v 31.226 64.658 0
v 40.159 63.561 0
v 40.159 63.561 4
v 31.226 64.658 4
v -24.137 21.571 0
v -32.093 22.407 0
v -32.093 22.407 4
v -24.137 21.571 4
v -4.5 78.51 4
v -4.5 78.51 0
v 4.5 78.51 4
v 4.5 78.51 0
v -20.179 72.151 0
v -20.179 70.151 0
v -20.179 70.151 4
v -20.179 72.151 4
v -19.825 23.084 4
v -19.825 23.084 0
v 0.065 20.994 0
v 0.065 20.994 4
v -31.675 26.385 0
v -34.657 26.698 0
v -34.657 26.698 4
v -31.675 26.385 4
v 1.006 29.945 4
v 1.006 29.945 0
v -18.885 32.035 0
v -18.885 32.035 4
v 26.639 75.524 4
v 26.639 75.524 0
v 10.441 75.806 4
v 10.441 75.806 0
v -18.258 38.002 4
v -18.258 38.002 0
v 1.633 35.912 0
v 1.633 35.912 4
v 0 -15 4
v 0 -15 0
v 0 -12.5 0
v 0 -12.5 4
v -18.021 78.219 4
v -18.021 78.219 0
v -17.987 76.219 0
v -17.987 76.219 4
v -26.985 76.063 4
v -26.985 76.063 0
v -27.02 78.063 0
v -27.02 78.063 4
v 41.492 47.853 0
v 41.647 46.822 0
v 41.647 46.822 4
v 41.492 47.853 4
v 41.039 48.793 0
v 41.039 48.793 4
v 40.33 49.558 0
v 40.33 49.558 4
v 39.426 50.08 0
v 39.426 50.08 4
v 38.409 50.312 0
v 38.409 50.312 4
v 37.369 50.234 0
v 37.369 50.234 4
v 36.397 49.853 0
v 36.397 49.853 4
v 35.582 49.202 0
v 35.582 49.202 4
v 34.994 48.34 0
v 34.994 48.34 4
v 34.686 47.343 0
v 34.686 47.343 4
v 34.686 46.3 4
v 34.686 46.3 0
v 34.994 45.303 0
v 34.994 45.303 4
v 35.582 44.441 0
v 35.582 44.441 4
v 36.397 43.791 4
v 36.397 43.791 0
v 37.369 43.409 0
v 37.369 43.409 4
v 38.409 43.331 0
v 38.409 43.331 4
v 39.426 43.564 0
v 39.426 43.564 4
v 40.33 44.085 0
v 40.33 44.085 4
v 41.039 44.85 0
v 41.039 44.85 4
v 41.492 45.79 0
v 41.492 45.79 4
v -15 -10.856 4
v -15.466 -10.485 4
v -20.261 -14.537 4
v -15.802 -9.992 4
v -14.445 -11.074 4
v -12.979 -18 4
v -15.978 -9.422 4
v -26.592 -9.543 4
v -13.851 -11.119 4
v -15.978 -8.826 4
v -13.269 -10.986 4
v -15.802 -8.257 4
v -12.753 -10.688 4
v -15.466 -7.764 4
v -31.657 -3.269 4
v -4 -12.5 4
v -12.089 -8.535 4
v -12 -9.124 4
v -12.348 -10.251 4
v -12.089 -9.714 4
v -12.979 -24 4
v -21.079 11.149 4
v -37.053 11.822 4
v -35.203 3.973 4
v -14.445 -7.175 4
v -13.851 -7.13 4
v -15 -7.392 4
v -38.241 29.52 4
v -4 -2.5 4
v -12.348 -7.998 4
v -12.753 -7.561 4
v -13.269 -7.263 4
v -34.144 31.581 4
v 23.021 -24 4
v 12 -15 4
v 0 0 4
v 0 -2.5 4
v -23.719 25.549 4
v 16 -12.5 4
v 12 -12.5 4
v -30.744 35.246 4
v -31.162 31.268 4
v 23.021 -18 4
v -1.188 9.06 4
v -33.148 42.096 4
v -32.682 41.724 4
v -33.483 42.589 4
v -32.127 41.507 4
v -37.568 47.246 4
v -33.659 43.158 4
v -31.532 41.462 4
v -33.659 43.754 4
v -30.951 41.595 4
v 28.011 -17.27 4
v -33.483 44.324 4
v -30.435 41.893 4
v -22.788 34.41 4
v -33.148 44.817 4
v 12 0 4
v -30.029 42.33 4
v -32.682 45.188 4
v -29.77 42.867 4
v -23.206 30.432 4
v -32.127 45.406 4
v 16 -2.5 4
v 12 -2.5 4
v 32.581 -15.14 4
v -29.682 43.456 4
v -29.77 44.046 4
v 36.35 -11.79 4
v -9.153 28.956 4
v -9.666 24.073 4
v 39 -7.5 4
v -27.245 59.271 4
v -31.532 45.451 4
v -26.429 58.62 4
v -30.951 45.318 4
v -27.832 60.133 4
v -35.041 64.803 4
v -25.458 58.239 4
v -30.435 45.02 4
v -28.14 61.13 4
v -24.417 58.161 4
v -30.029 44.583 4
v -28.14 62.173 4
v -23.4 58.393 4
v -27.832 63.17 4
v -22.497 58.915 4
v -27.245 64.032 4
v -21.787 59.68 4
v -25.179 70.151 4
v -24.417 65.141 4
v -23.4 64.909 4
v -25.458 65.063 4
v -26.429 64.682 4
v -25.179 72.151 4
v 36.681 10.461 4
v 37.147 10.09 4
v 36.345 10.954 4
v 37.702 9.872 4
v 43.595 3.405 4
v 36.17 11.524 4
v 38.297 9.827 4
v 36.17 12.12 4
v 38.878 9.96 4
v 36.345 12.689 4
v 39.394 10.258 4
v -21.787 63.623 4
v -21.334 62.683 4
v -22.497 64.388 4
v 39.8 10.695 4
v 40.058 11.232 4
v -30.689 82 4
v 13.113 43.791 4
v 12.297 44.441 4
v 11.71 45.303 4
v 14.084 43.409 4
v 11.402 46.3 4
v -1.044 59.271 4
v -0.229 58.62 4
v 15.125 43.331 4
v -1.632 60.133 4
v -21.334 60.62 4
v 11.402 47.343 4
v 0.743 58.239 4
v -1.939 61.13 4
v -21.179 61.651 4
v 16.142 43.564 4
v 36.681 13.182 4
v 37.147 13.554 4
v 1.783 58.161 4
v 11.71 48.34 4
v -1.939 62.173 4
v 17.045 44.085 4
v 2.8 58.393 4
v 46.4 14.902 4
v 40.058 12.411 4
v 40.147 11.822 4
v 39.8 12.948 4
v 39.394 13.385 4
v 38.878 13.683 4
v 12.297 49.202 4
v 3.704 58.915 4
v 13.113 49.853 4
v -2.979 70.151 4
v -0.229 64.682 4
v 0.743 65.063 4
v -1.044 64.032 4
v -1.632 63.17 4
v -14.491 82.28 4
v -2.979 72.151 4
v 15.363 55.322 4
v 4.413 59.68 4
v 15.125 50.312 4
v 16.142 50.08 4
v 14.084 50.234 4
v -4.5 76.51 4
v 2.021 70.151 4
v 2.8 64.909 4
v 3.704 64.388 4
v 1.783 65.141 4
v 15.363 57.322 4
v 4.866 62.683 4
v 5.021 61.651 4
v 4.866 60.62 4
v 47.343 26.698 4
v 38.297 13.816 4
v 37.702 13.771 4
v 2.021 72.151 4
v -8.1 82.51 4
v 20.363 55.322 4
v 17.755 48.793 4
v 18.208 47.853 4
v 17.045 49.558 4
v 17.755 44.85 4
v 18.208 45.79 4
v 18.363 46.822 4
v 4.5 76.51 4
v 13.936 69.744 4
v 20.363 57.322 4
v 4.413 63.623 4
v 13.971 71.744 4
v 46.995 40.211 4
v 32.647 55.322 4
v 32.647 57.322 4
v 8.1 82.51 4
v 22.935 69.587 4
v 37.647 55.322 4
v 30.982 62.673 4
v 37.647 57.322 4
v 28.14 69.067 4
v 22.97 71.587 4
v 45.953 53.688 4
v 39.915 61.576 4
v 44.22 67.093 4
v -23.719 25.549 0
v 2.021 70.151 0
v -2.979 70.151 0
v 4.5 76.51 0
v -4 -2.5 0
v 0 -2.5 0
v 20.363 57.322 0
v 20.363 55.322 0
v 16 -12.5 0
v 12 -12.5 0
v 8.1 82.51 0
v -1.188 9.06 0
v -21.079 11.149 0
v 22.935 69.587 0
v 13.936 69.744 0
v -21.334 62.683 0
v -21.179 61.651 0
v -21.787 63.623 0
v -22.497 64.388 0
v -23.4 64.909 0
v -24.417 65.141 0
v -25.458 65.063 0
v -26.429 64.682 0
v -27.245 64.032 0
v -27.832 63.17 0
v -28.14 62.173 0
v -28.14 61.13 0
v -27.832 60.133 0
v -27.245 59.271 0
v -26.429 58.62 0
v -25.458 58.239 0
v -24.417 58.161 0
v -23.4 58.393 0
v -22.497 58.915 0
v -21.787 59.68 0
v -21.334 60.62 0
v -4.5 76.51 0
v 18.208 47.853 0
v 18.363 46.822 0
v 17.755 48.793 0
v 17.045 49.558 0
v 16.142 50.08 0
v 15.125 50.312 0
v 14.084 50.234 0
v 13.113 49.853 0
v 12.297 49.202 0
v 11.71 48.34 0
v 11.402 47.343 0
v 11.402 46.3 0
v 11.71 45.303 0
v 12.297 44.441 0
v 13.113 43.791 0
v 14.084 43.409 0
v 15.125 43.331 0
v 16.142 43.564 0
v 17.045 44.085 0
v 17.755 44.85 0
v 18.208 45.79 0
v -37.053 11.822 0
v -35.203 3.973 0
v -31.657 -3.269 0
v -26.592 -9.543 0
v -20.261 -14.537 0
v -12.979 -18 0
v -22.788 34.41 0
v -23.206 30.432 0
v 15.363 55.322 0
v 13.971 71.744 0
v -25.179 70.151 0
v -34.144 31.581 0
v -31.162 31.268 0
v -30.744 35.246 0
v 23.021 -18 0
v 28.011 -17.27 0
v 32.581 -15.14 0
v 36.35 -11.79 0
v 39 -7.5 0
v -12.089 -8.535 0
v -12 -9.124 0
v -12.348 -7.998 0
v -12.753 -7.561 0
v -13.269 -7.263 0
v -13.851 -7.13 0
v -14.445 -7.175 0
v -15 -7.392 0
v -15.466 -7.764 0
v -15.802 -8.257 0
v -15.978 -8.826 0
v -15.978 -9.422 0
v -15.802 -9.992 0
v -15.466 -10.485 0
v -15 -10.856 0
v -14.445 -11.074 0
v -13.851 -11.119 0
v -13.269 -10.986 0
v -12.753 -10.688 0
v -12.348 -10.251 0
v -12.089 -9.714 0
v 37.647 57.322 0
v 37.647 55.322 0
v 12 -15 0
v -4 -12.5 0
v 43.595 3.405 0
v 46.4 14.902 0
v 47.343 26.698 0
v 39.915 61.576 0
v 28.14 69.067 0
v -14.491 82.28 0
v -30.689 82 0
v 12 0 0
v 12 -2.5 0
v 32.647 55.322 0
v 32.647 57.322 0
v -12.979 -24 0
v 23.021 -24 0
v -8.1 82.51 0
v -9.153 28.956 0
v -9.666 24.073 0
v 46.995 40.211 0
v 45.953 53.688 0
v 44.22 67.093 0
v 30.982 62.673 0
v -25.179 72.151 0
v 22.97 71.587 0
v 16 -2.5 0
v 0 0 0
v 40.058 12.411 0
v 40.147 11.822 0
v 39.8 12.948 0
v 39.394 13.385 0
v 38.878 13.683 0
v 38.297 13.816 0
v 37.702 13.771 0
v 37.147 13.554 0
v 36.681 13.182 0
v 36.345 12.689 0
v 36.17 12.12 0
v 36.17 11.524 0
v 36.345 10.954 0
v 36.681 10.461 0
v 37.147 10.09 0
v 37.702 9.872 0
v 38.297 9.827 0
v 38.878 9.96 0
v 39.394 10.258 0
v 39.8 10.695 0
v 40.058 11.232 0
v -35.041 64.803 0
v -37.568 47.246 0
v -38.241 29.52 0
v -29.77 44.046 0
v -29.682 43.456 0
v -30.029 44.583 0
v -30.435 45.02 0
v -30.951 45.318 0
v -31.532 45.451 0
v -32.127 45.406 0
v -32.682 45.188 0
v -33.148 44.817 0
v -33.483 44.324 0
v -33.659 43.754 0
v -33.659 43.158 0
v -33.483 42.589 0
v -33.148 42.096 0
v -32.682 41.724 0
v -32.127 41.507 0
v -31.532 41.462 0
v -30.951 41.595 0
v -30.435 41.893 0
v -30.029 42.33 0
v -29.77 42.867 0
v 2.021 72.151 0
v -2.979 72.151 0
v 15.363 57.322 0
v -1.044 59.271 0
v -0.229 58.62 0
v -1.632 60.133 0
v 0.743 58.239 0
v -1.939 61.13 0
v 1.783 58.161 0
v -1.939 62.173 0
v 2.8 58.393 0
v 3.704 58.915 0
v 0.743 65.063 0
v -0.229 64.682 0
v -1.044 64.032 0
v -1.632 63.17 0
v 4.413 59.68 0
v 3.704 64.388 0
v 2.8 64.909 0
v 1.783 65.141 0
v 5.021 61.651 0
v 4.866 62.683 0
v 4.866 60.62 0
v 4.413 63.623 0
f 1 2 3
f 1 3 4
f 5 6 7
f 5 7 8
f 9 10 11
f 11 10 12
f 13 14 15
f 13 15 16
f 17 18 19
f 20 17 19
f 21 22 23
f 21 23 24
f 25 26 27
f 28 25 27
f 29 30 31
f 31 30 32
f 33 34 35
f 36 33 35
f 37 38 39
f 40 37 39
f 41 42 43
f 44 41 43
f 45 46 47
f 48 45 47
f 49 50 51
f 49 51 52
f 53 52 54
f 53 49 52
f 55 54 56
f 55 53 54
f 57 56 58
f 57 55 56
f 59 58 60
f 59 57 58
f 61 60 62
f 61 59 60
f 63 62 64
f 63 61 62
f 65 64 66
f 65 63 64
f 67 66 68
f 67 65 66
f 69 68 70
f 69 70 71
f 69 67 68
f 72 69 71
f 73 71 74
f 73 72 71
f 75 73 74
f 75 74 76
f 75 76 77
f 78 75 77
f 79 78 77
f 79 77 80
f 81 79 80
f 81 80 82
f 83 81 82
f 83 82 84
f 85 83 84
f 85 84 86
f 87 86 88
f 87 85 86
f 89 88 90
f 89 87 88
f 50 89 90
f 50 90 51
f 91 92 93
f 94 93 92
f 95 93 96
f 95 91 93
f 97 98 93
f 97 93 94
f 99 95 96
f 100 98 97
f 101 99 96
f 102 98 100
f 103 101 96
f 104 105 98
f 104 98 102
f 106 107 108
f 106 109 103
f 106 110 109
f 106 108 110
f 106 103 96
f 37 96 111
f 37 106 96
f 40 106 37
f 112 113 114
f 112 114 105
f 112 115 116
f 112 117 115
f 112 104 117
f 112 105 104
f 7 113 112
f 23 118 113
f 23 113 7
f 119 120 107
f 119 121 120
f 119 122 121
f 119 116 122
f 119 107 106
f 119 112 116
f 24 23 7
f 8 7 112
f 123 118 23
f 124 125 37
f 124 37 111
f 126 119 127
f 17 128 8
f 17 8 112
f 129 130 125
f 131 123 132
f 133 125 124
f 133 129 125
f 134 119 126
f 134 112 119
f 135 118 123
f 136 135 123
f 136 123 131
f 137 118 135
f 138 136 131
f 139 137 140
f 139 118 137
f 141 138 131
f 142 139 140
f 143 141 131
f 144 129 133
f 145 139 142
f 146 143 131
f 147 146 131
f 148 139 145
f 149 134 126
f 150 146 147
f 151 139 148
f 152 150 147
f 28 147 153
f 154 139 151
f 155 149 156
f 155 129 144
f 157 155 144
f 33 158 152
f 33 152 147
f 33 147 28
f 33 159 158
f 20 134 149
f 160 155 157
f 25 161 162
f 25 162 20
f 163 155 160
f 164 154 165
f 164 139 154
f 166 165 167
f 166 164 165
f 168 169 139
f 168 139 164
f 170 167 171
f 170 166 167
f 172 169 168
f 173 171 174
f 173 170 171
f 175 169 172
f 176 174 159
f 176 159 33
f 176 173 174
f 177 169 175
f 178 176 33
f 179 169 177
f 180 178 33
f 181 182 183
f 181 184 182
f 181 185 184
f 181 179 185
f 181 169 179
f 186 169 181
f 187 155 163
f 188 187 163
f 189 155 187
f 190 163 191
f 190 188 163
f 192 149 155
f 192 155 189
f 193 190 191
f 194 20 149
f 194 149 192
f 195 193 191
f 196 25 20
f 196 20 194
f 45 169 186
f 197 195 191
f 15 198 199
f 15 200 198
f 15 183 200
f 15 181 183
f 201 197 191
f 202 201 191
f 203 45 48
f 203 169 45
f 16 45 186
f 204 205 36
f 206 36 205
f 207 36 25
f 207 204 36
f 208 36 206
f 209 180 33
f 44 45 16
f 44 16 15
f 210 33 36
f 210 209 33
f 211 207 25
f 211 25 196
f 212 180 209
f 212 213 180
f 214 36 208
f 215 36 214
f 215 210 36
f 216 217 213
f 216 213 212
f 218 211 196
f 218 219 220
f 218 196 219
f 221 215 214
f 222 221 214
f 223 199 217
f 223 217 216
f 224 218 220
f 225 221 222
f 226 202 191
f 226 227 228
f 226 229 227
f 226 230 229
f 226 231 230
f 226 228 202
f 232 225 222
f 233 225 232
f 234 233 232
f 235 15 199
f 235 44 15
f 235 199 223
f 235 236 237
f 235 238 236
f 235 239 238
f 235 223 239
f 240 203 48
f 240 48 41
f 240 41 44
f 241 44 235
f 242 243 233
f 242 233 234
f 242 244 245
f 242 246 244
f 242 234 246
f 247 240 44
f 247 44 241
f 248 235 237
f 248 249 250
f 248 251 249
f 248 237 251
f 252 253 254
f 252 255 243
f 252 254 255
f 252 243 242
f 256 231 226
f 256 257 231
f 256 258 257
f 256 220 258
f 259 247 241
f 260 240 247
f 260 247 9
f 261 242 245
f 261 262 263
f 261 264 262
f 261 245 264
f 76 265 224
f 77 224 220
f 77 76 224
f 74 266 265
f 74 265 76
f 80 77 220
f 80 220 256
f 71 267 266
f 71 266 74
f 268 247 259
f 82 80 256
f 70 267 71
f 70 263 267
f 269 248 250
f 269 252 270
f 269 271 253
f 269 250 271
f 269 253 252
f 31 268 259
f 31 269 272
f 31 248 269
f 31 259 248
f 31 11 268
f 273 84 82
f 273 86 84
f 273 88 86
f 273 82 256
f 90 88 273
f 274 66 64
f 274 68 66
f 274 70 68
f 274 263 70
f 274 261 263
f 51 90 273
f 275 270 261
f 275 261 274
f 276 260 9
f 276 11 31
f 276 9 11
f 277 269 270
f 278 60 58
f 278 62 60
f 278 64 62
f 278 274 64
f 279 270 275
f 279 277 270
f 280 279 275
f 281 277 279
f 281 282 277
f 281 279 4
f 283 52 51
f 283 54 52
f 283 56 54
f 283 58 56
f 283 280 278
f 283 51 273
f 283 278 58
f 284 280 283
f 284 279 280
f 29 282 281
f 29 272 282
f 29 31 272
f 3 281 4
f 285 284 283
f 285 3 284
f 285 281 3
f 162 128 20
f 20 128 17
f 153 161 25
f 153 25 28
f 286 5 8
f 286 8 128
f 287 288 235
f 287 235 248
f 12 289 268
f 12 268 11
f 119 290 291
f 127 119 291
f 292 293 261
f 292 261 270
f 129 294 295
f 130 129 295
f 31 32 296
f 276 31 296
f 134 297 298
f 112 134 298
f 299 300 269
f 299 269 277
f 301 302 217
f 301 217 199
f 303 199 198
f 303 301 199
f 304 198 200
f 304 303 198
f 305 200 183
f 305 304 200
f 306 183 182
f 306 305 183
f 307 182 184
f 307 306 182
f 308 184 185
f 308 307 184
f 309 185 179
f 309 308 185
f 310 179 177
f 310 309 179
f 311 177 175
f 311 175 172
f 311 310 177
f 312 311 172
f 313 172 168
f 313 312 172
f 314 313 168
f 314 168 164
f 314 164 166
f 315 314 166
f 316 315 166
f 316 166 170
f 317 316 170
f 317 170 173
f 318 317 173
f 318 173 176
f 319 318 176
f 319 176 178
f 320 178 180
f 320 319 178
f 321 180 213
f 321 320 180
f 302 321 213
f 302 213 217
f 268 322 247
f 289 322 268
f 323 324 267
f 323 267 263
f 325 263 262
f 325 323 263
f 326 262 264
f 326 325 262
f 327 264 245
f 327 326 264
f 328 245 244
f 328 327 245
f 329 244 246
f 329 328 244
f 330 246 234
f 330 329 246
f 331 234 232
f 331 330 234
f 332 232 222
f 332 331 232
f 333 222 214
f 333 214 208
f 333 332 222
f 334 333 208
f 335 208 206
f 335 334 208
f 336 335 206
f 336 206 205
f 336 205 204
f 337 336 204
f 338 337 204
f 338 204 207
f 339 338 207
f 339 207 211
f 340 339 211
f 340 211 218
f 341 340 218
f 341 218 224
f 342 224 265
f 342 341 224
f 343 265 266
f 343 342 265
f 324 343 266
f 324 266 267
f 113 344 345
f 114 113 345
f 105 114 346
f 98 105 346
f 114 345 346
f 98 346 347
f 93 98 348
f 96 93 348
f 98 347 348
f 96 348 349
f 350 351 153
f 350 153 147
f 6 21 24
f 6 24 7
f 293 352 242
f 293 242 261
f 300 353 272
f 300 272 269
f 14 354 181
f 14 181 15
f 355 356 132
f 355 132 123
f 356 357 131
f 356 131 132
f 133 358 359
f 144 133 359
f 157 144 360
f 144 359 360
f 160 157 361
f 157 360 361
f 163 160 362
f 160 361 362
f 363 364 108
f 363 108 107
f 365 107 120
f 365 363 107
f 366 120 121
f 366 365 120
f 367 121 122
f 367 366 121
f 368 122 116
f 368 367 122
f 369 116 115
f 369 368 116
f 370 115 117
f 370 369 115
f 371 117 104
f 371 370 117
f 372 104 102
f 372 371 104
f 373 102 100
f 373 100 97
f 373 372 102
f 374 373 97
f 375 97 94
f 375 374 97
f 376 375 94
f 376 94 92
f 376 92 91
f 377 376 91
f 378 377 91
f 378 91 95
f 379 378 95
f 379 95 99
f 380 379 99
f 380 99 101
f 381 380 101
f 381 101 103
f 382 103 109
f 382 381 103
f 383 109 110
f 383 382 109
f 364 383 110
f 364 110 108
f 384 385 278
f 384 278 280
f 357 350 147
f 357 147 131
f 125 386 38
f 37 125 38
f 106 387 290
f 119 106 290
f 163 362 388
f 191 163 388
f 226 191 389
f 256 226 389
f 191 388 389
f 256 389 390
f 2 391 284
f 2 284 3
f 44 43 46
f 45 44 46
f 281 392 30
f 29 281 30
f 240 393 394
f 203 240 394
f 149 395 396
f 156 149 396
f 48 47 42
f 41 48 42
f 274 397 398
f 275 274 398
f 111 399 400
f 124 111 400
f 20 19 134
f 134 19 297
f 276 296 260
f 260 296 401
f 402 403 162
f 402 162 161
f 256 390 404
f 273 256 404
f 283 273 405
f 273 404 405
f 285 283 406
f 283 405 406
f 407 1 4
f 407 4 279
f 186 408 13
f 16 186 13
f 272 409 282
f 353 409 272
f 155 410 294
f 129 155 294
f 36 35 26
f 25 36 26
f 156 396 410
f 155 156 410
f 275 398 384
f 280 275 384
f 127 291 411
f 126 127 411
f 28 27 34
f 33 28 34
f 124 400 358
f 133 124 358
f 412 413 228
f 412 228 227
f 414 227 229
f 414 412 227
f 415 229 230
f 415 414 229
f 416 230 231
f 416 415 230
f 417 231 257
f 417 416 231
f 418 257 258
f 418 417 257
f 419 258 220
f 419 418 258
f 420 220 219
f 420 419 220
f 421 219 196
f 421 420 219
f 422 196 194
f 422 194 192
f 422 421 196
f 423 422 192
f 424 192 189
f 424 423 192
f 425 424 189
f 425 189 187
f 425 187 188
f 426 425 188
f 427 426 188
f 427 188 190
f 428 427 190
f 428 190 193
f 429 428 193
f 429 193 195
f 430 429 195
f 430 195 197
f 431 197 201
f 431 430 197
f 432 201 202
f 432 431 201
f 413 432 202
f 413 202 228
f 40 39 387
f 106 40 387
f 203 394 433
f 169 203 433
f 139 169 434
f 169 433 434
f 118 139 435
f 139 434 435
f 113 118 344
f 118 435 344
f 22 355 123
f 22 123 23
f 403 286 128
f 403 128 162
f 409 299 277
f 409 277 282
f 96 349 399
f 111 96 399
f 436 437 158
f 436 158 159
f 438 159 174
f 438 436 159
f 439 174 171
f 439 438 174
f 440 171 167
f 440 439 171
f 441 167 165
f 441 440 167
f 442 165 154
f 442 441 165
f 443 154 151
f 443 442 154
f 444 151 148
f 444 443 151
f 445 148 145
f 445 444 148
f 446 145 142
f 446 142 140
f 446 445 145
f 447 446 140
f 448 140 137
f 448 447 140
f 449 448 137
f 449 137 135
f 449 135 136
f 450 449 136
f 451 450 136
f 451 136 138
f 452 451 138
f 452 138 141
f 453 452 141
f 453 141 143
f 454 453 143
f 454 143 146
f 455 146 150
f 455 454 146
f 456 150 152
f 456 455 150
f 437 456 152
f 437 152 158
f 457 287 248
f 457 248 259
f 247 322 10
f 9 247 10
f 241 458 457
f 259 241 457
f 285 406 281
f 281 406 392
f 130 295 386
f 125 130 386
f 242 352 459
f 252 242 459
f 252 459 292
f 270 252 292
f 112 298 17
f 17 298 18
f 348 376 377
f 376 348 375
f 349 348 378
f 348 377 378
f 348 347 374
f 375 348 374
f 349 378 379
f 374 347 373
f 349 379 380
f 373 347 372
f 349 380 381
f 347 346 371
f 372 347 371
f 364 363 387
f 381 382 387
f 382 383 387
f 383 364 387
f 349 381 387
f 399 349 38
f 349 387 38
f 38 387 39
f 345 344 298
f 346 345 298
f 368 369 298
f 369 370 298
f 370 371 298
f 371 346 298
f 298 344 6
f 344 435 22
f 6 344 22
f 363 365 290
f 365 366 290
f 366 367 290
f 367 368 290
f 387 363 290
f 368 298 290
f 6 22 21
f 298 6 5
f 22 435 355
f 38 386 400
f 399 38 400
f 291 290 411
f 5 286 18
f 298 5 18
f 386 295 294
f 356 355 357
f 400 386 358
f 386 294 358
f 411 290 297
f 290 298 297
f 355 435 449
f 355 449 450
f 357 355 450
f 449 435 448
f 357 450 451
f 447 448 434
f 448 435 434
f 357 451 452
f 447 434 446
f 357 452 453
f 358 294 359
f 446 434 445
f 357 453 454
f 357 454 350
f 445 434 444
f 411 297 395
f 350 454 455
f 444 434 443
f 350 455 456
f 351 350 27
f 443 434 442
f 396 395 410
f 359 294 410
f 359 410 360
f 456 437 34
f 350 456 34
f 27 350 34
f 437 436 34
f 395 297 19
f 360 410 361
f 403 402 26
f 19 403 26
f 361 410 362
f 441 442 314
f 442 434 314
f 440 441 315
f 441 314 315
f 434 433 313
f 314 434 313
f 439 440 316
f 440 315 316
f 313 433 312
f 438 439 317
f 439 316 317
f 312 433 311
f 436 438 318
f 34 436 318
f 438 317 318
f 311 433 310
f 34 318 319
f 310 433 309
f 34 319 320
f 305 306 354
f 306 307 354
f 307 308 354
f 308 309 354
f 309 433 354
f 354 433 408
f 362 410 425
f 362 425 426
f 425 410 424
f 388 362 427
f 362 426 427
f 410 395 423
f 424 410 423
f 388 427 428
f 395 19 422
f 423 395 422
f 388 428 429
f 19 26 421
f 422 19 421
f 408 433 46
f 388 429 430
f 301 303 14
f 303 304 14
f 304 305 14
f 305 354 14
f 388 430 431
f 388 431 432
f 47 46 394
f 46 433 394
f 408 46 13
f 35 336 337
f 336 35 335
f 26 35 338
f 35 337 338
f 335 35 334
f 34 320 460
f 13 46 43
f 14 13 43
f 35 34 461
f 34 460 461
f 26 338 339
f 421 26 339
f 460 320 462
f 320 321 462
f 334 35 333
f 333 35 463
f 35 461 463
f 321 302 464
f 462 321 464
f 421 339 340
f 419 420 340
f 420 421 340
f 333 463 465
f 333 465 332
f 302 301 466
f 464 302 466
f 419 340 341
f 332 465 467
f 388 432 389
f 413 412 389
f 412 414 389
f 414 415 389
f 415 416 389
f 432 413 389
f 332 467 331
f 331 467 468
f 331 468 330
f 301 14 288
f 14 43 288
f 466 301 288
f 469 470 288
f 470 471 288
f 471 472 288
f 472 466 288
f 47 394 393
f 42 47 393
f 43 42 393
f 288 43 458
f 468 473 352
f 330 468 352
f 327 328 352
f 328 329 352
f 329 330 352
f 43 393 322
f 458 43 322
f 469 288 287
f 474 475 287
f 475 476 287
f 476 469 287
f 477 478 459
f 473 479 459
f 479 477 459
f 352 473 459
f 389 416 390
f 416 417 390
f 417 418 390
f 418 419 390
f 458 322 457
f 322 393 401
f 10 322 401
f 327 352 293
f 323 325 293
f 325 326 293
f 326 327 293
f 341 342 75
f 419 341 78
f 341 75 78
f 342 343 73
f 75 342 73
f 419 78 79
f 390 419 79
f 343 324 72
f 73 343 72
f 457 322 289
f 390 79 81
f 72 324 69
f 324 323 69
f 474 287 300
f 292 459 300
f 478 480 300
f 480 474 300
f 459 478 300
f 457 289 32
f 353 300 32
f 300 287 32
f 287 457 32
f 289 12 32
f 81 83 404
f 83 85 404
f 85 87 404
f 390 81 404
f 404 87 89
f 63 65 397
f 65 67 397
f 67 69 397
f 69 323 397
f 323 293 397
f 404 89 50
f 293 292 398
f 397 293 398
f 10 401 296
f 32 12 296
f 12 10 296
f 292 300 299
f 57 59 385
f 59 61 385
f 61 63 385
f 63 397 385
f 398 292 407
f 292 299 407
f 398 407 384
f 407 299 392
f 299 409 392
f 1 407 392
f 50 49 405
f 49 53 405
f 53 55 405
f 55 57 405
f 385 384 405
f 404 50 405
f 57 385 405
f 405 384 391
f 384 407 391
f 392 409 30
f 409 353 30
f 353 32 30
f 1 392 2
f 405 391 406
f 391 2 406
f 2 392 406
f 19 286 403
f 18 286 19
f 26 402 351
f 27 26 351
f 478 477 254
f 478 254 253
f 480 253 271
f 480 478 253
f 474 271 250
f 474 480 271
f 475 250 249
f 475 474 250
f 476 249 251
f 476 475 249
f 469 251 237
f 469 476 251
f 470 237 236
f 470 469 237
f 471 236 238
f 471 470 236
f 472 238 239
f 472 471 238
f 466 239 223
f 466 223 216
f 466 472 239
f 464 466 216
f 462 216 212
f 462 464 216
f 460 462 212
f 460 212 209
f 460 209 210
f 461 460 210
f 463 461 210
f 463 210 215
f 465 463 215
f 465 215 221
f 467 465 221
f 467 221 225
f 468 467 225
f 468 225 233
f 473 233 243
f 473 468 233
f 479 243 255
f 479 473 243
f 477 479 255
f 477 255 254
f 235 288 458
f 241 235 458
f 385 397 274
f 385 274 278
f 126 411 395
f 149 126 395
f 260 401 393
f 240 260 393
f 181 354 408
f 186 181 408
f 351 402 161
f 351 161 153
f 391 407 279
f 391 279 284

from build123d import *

# Parameters (mm, degrees)
SKETCH1_R           = 2
SKETCH1_R_2         = 3.5
SKETCH1_W           = 9.000072
SKETCH1_H           = 2
SKETCH1_W_2         = 5
BOSS_EXTRUDE1_DEPTH = 4


with BuildPart() as part:
    # Sketch1 → Boss-Extrude1 (new body)
    with BuildSketch(Plane.XY):
        with BuildLine():
            Line((-12.978640908, -18), (-12.978640908, -24))
            Line((-12.978640908, -24), (23.021359092, -24))
            Line((23.021359092, -24), (23.021359092, -18))
            ThreePointArc((23.021359092, -18), (32.58126188, -15.140073441), (39, -7.5))
            ThreePointArc((39, -7.5), (45.227131985, 9.097629123), (47.343034567, 26.698237678))
            ThreePointArc((47.343034567, 26.698237678), (46.561018226, 46.955835458), (44.219623828, 67.092858318))
            Line((44.219623828, 67.092858318), (28.140376172, 69.067141682))
            Line((28.140376172, 69.067141682), (26.638766331, 75.523635508))
            Line((26.638766331, 75.523635508), (10.441233669, 75.806364492))
            Line((10.441233669, 75.806364492), (8.1, 82.51))
            Line((8.1, 82.51), (-8.1, 82.51))
            Line((-8.1, 82.51), (-14.491217975, 82.280462515))
            Line((-14.491217975, 82.280462515), (-30.688782025, 81.999537485))
            ThreePointArc((-30.688782025, 81.999537485), (-37.567707395, 47.245827753), (-37.052658257, 11.821617405))
            ThreePointArc((-37.052658257, 11.821617405), (-29.300451665, -6.548172019), (-12.978640908, -18))
        make_face()
        with Locations((38.147341743, 11.821617405)):
            Circle(SKETCH1_R, mode=Mode.SUBTRACT)
        with Locations((-24.678960076, 61.651218734)):
            Circle(SKETCH1_R_2, mode=Mode.SUBTRACT)
        with Locations((1.521420673, 61.651218734)):
            Circle(SKETCH1_R_2, mode=Mode.SUBTRACT)
        with Locations((14.86306514, 46.821617405)):
            Circle(SKETCH1_R_2, mode=Mode.SUBTRACT)
        with Locations((38.147341743, 46.821617405)):
            Circle(SKETCH1_R_2, mode=Mode.SUBTRACT)
        with Locations((-31.681501662, 43.456405989)):
            Circle(SKETCH1_R, mode=Mode.SUBTRACT)
        with Locations((-14, -9.124358763)):
            Circle(SKETCH1_R, mode=Mode.SUBTRACT)
        with Locations((0, 77.51)):
            Rectangle(SKETCH1_W, SKETCH1_H, mode=Mode.SUBTRACT)
        Polygon((-4, -2.5), (0, -2.5), (0, 0), (12, 0), (12, -2.5), (16, -2.5), (16, -12.5), (12, -12.5), (12, -15), (0, -15), (0, -12.5), (-4, -12.5), align=None, mode=Mode.SUBTRACT)
        with Locations((35.147341743, 56.321617405)):
            Rectangle(SKETCH1_W_2, SKETCH1_H, mode=Mode.SUBTRACT)
        Polygon((-27.019995137, 78.062566115), (-18.021276454, 78.218636824), (-17.986594351, 76.218937559), (-26.985313034, 76.062866849), align=None, mode=Mode.SUBTRACT)
        with Locations((17.86306514, 56.321617405)):
            Rectangle(SKETCH1_W_2, SKETCH1_H, mode=Mode.SUBTRACT)
        with Locations((-0.478579327, 71.151218734)):
            Rectangle(SKETCH1_W_2, SKETCH1_H, mode=Mode.SUBTRACT)
        Polygon((13.970839752, 71.744145677), (13.935934939, 69.744450286), (22.934636184, 69.587377372), (22.969540997, 71.587072762), align=None, mode=Mode.SUBTRACT)
        Polygon((40.15901604, 63.561398961), (31.226029212, 64.658231826), (30.982290526, 62.673139523), (39.915277354, 61.576306658), align=None, mode=Mode.SUBTRACT)
        Polygon((1.632632483, 35.912105076), (1.005748572, 29.944943559), (-18.884789816, 32.034556594), (-18.257905905, 38.00171811), align=None, mode=Mode.SUBTRACT)
        with Locations((-22.678960076, 71.151218734)):
            Rectangle(SKETCH1_W_2, SKETCH1_H, mode=Mode.SUBTRACT)
        Polygon((0.065422707, 20.994201285), (-1.188345114, 9.059878252), (-21.078883502, 11.149491286), (-19.825115681, 23.083814319), align=None, mode=Mode.SUBTRACT)
        Polygon((-9.666, 24.072796069), (-9.153, 28.955923243), (-23.205665371, 30.432234852), (-22.787742764, 34.410342529), (-30.743958119, 35.246187743), (-31.161880726, 31.268080066), (-34.143965433, 31.581364852), (-34.656965433, 26.698237678), (-31.674880726, 26.384952891), (-32.092803333, 22.406845214), (-24.136587978, 21.571), (-23.718665371, 25.549107678), align=None, mode=Mode.SUBTRACT)
    extrude(amount=BOSS_EXTRUDE1_DEPTH)


solid = part.part
